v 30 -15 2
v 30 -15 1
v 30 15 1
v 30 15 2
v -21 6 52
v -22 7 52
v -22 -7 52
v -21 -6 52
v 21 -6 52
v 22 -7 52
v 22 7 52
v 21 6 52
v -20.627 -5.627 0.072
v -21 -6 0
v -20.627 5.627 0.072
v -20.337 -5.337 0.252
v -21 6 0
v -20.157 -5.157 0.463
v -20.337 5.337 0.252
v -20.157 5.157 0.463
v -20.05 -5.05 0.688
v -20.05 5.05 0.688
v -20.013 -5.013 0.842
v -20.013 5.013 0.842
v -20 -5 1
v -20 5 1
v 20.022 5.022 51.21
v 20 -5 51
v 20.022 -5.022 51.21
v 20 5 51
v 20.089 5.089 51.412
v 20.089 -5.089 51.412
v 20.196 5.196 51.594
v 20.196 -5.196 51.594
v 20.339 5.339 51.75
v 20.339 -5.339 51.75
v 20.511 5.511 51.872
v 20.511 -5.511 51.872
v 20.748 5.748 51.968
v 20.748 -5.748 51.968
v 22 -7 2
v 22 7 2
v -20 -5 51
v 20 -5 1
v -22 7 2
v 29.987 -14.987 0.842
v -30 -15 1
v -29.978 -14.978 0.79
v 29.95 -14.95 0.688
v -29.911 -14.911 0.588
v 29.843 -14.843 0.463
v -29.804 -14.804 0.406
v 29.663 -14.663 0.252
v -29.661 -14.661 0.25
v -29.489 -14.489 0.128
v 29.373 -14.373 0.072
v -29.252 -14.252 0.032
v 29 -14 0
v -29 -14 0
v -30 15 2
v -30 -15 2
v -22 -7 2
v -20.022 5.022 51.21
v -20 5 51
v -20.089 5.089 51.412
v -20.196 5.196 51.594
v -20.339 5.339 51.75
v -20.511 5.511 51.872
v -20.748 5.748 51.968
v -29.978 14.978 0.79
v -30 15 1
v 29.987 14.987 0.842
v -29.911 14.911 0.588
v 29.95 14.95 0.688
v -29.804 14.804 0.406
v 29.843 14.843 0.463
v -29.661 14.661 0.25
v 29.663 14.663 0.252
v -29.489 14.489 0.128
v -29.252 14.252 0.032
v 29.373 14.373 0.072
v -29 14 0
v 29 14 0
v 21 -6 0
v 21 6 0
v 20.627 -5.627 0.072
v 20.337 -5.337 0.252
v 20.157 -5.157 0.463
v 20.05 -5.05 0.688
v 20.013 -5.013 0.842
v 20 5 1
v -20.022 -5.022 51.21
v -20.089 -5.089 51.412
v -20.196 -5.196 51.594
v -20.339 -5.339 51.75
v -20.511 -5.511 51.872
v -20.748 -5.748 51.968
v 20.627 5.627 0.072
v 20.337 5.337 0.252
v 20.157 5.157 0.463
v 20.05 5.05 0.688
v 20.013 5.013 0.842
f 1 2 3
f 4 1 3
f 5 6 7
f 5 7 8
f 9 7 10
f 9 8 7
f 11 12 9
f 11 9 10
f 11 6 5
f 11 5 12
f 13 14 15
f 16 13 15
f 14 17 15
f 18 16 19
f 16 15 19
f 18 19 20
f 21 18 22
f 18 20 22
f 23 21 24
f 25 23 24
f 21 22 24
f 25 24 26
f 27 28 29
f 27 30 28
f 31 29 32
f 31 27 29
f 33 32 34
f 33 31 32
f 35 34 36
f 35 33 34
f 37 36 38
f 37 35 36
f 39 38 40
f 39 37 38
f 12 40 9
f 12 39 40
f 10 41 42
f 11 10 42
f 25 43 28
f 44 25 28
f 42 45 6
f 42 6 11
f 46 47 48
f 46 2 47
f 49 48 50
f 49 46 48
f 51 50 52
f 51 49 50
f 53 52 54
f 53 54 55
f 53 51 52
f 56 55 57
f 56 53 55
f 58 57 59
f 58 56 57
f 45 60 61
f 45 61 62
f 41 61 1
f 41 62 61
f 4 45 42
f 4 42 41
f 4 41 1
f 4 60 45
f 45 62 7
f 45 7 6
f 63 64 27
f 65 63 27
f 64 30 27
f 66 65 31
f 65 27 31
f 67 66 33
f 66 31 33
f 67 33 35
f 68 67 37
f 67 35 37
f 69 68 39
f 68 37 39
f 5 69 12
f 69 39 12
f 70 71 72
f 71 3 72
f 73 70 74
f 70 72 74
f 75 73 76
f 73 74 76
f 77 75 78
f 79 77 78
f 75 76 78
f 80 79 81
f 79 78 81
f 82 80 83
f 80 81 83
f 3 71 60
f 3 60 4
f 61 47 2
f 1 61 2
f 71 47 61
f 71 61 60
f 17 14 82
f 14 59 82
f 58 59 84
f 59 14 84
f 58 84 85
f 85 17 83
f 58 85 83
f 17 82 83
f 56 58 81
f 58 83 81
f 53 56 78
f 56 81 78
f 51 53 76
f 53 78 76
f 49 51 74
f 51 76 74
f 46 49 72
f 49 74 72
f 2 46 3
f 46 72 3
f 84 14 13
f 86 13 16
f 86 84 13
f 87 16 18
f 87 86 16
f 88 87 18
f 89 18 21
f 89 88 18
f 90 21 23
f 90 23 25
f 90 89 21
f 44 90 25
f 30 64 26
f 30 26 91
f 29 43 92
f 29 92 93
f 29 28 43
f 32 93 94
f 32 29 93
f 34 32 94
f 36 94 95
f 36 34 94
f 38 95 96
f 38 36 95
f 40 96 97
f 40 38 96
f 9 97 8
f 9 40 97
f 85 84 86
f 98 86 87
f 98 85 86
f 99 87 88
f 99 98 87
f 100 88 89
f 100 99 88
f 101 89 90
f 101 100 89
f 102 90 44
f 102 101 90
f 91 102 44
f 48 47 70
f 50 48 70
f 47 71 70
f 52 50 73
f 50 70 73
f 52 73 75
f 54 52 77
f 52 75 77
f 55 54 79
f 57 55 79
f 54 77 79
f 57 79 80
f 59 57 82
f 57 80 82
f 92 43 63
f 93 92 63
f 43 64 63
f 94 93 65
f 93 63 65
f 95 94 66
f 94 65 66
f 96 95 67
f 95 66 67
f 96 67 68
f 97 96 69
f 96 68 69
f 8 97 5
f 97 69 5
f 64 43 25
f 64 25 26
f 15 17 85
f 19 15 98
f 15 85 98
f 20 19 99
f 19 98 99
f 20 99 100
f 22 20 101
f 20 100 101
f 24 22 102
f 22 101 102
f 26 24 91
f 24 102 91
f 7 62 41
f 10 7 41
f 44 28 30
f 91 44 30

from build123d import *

# Parameters (mm, degrees)
F0_W     = 60
F0_H     = 30
F1_DEPTH = 2
F2_W     = 44
F2_H     = 14
F3_DEPTH = 50
F4_W     = 40
F4_H     = 10
F5_DEPTH = 52.001
F6_R     = 1


with BuildPart() as f1:
    # F0 (on Top) → F1 (new body)
    with BuildSketch(Plane.XY):
        Rectangle(F0_W, F0_H)
    extrude(amount=F1_DEPTH)

    # F2 (on face) → F3 (join)
    with BuildSketch(Plane.XY.offset(2)):
        Rectangle(F2_W, F2_H)
    extrude(amount=F3_DEPTH)

    # F4 (on face) → F5 (cut, through all)
    with BuildSketch(Plane.XY.offset(52)):
        Rectangle(F4_W, F4_H)
    extrude(amount=-F5_DEPTH, mode=Mode.SUBTRACT)

    # F6
    f6_edges = [f1.edges().sort_by_distance(p)[0] for p in [
        (30, 0, 0),
        (0, -15, 0),
        (0, 15, 0),
        (-30, 0, 0),
        (20, 0, 0),
        (0, 5, 0),
        (-20, 0, 0),
        (0, -5, 0),
        (0, 5, 52),
        (-20, 0, 52),
        (0, -5, 52),
        (20, 0, 52),
    ]]
    fillet(f6_edges, radius=F6_R)


solid = f1.part
